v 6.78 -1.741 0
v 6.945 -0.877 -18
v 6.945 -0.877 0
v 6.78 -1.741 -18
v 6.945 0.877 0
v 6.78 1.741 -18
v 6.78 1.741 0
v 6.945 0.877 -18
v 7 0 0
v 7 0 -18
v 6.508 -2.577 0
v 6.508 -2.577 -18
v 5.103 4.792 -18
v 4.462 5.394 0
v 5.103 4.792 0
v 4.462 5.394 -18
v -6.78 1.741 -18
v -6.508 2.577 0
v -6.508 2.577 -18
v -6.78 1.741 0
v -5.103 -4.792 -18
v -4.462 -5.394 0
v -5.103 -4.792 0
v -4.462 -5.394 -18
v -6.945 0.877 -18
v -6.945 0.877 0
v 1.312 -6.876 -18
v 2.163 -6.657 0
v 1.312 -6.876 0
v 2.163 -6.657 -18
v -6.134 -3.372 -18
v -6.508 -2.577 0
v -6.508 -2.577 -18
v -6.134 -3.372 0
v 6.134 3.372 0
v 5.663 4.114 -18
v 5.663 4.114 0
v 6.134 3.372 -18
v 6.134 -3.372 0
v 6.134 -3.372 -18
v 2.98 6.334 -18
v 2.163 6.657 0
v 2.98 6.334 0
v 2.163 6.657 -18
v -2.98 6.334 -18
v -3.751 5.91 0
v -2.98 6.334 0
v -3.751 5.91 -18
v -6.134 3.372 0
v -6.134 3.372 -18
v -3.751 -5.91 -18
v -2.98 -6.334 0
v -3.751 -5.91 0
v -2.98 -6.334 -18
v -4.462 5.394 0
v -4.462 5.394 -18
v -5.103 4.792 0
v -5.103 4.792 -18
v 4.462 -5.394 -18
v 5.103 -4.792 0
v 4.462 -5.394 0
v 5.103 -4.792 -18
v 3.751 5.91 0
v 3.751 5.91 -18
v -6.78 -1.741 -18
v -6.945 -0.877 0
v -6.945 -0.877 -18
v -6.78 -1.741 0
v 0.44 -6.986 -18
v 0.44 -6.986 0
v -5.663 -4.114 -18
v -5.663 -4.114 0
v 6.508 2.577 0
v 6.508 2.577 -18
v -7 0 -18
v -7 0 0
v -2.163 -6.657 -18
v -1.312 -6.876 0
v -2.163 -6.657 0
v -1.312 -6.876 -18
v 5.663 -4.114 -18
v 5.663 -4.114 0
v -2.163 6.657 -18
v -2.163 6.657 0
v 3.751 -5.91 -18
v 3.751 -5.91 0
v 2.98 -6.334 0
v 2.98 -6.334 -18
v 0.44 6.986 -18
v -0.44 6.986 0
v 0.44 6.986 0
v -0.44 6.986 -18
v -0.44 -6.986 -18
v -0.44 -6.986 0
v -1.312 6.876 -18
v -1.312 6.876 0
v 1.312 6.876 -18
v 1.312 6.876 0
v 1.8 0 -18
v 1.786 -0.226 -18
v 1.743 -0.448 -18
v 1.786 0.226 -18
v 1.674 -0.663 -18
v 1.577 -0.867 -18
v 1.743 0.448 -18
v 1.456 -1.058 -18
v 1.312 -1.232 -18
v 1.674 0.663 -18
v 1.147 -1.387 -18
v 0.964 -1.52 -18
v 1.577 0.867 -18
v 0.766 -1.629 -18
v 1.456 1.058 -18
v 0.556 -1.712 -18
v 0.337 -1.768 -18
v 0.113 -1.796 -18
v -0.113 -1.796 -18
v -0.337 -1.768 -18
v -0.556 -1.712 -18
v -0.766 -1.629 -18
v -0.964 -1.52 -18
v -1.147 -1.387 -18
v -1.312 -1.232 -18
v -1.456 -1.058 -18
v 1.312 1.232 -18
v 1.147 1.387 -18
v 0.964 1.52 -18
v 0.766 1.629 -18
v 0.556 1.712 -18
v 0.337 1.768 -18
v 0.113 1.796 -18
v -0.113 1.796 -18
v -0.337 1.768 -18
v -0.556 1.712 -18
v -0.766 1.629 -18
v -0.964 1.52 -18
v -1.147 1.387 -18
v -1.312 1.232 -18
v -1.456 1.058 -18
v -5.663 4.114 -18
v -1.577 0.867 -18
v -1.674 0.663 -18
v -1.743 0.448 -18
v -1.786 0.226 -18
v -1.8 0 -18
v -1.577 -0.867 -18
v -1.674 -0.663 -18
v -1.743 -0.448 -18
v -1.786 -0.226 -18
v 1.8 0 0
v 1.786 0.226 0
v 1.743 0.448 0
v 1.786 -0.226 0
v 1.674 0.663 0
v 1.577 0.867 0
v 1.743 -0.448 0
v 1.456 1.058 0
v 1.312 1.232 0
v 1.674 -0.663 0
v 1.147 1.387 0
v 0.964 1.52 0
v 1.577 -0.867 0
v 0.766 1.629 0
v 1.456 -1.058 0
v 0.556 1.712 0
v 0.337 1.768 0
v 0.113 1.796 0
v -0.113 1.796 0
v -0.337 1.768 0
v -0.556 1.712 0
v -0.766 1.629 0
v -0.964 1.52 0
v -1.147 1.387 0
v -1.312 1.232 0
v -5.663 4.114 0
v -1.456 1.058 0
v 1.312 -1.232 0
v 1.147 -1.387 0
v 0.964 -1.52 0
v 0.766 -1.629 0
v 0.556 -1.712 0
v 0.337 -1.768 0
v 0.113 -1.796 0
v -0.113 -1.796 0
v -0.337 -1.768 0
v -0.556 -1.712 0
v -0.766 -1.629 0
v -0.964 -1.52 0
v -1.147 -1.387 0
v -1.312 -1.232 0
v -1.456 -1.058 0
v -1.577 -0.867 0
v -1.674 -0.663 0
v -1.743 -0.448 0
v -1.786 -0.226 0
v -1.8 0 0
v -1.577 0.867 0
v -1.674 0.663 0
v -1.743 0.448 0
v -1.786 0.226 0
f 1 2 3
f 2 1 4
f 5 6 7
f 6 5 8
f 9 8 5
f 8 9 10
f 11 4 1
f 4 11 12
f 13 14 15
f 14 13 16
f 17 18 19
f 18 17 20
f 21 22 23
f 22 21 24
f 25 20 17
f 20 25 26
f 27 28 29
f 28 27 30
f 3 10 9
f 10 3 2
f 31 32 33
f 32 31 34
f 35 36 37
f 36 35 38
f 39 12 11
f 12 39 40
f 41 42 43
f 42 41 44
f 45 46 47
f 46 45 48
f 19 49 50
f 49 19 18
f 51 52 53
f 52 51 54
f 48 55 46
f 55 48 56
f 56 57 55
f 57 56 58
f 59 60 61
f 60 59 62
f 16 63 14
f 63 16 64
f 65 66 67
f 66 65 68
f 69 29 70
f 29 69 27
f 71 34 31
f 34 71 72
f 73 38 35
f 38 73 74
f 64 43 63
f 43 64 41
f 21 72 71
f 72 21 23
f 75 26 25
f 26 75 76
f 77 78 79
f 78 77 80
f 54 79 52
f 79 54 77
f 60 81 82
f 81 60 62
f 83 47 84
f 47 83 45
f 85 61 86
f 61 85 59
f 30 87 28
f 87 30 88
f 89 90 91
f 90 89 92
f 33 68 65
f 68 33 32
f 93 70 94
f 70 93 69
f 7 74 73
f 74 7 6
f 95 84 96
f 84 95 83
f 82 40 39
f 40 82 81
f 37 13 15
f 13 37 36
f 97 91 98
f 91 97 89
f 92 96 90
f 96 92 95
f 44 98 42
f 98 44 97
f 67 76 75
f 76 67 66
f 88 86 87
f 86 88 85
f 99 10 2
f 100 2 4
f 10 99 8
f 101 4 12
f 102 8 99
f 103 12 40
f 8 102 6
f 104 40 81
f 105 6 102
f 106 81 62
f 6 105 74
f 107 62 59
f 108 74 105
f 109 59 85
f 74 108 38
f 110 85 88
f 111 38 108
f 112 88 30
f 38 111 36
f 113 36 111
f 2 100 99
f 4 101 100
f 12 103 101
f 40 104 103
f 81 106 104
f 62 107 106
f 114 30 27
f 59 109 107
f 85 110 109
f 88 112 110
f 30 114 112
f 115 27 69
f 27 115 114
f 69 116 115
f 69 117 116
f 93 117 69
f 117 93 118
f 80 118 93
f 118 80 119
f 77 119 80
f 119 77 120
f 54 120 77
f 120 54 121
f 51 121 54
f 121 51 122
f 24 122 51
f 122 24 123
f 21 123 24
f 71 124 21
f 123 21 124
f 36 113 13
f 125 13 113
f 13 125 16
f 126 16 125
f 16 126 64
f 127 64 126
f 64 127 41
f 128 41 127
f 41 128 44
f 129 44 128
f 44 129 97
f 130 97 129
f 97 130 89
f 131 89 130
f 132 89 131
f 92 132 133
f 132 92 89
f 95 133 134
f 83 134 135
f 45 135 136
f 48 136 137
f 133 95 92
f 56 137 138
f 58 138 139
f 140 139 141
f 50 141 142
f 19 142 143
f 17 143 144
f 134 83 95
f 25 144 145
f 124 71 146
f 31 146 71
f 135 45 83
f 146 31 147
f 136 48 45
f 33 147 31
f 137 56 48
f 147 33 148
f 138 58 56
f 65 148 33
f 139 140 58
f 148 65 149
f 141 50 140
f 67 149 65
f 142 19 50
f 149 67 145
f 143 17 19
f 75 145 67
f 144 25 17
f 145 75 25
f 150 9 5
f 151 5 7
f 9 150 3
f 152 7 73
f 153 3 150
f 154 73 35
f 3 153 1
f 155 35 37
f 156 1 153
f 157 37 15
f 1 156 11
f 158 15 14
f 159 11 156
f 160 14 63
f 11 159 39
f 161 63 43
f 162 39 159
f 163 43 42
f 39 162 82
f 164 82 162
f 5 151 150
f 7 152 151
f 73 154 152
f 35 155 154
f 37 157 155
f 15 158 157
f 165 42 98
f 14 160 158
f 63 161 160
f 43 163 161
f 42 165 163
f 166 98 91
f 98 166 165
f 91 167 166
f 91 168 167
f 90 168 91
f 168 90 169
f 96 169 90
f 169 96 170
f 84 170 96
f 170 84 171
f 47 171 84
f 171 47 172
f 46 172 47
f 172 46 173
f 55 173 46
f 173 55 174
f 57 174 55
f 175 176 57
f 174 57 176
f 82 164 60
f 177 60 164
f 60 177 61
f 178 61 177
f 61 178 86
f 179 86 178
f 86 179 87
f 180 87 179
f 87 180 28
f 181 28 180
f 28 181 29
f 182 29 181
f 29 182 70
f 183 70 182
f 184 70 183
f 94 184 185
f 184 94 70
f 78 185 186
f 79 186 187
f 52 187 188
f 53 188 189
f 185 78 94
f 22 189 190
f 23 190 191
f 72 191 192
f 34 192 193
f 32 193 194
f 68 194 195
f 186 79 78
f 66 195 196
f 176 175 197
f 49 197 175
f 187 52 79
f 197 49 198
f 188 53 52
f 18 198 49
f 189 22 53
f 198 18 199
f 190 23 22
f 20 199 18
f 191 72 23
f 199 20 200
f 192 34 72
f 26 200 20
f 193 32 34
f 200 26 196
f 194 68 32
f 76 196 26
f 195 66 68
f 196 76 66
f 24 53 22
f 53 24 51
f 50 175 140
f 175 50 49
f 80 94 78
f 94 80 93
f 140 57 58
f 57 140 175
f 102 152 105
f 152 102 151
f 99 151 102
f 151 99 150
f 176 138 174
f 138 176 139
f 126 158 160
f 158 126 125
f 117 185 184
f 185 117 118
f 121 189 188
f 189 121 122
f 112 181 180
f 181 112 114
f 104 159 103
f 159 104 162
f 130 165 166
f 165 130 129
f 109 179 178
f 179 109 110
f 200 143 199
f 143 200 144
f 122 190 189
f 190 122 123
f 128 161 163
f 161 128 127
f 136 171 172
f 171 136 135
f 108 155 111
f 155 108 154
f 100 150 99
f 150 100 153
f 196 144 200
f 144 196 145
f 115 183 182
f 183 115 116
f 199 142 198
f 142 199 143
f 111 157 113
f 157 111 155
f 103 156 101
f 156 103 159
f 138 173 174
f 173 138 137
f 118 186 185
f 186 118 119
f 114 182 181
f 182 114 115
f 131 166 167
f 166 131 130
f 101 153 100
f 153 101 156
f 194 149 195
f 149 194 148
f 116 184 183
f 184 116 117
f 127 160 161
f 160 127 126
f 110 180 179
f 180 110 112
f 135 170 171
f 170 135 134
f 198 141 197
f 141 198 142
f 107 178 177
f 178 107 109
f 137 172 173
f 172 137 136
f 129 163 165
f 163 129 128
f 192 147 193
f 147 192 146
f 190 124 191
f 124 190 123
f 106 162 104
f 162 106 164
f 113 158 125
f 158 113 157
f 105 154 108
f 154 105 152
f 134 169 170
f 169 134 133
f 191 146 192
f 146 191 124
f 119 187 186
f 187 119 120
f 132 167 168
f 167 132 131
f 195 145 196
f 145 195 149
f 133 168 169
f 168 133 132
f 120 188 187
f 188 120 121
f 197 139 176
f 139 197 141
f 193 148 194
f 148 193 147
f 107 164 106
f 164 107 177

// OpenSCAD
$fn = 50;


difference() {
	union() {
		translate(v = [0, 0, -18.0000000000]) {
			cylinder(h = 18, r = 7.0000000000);
		}
		cylinder(h = 0, r = 10.0000000000);
	}
	union() {
		#translate(v = [0, 0, -18]) {
			cylinder(h = 18, r = 1.8000000000);
		}
	}
}
